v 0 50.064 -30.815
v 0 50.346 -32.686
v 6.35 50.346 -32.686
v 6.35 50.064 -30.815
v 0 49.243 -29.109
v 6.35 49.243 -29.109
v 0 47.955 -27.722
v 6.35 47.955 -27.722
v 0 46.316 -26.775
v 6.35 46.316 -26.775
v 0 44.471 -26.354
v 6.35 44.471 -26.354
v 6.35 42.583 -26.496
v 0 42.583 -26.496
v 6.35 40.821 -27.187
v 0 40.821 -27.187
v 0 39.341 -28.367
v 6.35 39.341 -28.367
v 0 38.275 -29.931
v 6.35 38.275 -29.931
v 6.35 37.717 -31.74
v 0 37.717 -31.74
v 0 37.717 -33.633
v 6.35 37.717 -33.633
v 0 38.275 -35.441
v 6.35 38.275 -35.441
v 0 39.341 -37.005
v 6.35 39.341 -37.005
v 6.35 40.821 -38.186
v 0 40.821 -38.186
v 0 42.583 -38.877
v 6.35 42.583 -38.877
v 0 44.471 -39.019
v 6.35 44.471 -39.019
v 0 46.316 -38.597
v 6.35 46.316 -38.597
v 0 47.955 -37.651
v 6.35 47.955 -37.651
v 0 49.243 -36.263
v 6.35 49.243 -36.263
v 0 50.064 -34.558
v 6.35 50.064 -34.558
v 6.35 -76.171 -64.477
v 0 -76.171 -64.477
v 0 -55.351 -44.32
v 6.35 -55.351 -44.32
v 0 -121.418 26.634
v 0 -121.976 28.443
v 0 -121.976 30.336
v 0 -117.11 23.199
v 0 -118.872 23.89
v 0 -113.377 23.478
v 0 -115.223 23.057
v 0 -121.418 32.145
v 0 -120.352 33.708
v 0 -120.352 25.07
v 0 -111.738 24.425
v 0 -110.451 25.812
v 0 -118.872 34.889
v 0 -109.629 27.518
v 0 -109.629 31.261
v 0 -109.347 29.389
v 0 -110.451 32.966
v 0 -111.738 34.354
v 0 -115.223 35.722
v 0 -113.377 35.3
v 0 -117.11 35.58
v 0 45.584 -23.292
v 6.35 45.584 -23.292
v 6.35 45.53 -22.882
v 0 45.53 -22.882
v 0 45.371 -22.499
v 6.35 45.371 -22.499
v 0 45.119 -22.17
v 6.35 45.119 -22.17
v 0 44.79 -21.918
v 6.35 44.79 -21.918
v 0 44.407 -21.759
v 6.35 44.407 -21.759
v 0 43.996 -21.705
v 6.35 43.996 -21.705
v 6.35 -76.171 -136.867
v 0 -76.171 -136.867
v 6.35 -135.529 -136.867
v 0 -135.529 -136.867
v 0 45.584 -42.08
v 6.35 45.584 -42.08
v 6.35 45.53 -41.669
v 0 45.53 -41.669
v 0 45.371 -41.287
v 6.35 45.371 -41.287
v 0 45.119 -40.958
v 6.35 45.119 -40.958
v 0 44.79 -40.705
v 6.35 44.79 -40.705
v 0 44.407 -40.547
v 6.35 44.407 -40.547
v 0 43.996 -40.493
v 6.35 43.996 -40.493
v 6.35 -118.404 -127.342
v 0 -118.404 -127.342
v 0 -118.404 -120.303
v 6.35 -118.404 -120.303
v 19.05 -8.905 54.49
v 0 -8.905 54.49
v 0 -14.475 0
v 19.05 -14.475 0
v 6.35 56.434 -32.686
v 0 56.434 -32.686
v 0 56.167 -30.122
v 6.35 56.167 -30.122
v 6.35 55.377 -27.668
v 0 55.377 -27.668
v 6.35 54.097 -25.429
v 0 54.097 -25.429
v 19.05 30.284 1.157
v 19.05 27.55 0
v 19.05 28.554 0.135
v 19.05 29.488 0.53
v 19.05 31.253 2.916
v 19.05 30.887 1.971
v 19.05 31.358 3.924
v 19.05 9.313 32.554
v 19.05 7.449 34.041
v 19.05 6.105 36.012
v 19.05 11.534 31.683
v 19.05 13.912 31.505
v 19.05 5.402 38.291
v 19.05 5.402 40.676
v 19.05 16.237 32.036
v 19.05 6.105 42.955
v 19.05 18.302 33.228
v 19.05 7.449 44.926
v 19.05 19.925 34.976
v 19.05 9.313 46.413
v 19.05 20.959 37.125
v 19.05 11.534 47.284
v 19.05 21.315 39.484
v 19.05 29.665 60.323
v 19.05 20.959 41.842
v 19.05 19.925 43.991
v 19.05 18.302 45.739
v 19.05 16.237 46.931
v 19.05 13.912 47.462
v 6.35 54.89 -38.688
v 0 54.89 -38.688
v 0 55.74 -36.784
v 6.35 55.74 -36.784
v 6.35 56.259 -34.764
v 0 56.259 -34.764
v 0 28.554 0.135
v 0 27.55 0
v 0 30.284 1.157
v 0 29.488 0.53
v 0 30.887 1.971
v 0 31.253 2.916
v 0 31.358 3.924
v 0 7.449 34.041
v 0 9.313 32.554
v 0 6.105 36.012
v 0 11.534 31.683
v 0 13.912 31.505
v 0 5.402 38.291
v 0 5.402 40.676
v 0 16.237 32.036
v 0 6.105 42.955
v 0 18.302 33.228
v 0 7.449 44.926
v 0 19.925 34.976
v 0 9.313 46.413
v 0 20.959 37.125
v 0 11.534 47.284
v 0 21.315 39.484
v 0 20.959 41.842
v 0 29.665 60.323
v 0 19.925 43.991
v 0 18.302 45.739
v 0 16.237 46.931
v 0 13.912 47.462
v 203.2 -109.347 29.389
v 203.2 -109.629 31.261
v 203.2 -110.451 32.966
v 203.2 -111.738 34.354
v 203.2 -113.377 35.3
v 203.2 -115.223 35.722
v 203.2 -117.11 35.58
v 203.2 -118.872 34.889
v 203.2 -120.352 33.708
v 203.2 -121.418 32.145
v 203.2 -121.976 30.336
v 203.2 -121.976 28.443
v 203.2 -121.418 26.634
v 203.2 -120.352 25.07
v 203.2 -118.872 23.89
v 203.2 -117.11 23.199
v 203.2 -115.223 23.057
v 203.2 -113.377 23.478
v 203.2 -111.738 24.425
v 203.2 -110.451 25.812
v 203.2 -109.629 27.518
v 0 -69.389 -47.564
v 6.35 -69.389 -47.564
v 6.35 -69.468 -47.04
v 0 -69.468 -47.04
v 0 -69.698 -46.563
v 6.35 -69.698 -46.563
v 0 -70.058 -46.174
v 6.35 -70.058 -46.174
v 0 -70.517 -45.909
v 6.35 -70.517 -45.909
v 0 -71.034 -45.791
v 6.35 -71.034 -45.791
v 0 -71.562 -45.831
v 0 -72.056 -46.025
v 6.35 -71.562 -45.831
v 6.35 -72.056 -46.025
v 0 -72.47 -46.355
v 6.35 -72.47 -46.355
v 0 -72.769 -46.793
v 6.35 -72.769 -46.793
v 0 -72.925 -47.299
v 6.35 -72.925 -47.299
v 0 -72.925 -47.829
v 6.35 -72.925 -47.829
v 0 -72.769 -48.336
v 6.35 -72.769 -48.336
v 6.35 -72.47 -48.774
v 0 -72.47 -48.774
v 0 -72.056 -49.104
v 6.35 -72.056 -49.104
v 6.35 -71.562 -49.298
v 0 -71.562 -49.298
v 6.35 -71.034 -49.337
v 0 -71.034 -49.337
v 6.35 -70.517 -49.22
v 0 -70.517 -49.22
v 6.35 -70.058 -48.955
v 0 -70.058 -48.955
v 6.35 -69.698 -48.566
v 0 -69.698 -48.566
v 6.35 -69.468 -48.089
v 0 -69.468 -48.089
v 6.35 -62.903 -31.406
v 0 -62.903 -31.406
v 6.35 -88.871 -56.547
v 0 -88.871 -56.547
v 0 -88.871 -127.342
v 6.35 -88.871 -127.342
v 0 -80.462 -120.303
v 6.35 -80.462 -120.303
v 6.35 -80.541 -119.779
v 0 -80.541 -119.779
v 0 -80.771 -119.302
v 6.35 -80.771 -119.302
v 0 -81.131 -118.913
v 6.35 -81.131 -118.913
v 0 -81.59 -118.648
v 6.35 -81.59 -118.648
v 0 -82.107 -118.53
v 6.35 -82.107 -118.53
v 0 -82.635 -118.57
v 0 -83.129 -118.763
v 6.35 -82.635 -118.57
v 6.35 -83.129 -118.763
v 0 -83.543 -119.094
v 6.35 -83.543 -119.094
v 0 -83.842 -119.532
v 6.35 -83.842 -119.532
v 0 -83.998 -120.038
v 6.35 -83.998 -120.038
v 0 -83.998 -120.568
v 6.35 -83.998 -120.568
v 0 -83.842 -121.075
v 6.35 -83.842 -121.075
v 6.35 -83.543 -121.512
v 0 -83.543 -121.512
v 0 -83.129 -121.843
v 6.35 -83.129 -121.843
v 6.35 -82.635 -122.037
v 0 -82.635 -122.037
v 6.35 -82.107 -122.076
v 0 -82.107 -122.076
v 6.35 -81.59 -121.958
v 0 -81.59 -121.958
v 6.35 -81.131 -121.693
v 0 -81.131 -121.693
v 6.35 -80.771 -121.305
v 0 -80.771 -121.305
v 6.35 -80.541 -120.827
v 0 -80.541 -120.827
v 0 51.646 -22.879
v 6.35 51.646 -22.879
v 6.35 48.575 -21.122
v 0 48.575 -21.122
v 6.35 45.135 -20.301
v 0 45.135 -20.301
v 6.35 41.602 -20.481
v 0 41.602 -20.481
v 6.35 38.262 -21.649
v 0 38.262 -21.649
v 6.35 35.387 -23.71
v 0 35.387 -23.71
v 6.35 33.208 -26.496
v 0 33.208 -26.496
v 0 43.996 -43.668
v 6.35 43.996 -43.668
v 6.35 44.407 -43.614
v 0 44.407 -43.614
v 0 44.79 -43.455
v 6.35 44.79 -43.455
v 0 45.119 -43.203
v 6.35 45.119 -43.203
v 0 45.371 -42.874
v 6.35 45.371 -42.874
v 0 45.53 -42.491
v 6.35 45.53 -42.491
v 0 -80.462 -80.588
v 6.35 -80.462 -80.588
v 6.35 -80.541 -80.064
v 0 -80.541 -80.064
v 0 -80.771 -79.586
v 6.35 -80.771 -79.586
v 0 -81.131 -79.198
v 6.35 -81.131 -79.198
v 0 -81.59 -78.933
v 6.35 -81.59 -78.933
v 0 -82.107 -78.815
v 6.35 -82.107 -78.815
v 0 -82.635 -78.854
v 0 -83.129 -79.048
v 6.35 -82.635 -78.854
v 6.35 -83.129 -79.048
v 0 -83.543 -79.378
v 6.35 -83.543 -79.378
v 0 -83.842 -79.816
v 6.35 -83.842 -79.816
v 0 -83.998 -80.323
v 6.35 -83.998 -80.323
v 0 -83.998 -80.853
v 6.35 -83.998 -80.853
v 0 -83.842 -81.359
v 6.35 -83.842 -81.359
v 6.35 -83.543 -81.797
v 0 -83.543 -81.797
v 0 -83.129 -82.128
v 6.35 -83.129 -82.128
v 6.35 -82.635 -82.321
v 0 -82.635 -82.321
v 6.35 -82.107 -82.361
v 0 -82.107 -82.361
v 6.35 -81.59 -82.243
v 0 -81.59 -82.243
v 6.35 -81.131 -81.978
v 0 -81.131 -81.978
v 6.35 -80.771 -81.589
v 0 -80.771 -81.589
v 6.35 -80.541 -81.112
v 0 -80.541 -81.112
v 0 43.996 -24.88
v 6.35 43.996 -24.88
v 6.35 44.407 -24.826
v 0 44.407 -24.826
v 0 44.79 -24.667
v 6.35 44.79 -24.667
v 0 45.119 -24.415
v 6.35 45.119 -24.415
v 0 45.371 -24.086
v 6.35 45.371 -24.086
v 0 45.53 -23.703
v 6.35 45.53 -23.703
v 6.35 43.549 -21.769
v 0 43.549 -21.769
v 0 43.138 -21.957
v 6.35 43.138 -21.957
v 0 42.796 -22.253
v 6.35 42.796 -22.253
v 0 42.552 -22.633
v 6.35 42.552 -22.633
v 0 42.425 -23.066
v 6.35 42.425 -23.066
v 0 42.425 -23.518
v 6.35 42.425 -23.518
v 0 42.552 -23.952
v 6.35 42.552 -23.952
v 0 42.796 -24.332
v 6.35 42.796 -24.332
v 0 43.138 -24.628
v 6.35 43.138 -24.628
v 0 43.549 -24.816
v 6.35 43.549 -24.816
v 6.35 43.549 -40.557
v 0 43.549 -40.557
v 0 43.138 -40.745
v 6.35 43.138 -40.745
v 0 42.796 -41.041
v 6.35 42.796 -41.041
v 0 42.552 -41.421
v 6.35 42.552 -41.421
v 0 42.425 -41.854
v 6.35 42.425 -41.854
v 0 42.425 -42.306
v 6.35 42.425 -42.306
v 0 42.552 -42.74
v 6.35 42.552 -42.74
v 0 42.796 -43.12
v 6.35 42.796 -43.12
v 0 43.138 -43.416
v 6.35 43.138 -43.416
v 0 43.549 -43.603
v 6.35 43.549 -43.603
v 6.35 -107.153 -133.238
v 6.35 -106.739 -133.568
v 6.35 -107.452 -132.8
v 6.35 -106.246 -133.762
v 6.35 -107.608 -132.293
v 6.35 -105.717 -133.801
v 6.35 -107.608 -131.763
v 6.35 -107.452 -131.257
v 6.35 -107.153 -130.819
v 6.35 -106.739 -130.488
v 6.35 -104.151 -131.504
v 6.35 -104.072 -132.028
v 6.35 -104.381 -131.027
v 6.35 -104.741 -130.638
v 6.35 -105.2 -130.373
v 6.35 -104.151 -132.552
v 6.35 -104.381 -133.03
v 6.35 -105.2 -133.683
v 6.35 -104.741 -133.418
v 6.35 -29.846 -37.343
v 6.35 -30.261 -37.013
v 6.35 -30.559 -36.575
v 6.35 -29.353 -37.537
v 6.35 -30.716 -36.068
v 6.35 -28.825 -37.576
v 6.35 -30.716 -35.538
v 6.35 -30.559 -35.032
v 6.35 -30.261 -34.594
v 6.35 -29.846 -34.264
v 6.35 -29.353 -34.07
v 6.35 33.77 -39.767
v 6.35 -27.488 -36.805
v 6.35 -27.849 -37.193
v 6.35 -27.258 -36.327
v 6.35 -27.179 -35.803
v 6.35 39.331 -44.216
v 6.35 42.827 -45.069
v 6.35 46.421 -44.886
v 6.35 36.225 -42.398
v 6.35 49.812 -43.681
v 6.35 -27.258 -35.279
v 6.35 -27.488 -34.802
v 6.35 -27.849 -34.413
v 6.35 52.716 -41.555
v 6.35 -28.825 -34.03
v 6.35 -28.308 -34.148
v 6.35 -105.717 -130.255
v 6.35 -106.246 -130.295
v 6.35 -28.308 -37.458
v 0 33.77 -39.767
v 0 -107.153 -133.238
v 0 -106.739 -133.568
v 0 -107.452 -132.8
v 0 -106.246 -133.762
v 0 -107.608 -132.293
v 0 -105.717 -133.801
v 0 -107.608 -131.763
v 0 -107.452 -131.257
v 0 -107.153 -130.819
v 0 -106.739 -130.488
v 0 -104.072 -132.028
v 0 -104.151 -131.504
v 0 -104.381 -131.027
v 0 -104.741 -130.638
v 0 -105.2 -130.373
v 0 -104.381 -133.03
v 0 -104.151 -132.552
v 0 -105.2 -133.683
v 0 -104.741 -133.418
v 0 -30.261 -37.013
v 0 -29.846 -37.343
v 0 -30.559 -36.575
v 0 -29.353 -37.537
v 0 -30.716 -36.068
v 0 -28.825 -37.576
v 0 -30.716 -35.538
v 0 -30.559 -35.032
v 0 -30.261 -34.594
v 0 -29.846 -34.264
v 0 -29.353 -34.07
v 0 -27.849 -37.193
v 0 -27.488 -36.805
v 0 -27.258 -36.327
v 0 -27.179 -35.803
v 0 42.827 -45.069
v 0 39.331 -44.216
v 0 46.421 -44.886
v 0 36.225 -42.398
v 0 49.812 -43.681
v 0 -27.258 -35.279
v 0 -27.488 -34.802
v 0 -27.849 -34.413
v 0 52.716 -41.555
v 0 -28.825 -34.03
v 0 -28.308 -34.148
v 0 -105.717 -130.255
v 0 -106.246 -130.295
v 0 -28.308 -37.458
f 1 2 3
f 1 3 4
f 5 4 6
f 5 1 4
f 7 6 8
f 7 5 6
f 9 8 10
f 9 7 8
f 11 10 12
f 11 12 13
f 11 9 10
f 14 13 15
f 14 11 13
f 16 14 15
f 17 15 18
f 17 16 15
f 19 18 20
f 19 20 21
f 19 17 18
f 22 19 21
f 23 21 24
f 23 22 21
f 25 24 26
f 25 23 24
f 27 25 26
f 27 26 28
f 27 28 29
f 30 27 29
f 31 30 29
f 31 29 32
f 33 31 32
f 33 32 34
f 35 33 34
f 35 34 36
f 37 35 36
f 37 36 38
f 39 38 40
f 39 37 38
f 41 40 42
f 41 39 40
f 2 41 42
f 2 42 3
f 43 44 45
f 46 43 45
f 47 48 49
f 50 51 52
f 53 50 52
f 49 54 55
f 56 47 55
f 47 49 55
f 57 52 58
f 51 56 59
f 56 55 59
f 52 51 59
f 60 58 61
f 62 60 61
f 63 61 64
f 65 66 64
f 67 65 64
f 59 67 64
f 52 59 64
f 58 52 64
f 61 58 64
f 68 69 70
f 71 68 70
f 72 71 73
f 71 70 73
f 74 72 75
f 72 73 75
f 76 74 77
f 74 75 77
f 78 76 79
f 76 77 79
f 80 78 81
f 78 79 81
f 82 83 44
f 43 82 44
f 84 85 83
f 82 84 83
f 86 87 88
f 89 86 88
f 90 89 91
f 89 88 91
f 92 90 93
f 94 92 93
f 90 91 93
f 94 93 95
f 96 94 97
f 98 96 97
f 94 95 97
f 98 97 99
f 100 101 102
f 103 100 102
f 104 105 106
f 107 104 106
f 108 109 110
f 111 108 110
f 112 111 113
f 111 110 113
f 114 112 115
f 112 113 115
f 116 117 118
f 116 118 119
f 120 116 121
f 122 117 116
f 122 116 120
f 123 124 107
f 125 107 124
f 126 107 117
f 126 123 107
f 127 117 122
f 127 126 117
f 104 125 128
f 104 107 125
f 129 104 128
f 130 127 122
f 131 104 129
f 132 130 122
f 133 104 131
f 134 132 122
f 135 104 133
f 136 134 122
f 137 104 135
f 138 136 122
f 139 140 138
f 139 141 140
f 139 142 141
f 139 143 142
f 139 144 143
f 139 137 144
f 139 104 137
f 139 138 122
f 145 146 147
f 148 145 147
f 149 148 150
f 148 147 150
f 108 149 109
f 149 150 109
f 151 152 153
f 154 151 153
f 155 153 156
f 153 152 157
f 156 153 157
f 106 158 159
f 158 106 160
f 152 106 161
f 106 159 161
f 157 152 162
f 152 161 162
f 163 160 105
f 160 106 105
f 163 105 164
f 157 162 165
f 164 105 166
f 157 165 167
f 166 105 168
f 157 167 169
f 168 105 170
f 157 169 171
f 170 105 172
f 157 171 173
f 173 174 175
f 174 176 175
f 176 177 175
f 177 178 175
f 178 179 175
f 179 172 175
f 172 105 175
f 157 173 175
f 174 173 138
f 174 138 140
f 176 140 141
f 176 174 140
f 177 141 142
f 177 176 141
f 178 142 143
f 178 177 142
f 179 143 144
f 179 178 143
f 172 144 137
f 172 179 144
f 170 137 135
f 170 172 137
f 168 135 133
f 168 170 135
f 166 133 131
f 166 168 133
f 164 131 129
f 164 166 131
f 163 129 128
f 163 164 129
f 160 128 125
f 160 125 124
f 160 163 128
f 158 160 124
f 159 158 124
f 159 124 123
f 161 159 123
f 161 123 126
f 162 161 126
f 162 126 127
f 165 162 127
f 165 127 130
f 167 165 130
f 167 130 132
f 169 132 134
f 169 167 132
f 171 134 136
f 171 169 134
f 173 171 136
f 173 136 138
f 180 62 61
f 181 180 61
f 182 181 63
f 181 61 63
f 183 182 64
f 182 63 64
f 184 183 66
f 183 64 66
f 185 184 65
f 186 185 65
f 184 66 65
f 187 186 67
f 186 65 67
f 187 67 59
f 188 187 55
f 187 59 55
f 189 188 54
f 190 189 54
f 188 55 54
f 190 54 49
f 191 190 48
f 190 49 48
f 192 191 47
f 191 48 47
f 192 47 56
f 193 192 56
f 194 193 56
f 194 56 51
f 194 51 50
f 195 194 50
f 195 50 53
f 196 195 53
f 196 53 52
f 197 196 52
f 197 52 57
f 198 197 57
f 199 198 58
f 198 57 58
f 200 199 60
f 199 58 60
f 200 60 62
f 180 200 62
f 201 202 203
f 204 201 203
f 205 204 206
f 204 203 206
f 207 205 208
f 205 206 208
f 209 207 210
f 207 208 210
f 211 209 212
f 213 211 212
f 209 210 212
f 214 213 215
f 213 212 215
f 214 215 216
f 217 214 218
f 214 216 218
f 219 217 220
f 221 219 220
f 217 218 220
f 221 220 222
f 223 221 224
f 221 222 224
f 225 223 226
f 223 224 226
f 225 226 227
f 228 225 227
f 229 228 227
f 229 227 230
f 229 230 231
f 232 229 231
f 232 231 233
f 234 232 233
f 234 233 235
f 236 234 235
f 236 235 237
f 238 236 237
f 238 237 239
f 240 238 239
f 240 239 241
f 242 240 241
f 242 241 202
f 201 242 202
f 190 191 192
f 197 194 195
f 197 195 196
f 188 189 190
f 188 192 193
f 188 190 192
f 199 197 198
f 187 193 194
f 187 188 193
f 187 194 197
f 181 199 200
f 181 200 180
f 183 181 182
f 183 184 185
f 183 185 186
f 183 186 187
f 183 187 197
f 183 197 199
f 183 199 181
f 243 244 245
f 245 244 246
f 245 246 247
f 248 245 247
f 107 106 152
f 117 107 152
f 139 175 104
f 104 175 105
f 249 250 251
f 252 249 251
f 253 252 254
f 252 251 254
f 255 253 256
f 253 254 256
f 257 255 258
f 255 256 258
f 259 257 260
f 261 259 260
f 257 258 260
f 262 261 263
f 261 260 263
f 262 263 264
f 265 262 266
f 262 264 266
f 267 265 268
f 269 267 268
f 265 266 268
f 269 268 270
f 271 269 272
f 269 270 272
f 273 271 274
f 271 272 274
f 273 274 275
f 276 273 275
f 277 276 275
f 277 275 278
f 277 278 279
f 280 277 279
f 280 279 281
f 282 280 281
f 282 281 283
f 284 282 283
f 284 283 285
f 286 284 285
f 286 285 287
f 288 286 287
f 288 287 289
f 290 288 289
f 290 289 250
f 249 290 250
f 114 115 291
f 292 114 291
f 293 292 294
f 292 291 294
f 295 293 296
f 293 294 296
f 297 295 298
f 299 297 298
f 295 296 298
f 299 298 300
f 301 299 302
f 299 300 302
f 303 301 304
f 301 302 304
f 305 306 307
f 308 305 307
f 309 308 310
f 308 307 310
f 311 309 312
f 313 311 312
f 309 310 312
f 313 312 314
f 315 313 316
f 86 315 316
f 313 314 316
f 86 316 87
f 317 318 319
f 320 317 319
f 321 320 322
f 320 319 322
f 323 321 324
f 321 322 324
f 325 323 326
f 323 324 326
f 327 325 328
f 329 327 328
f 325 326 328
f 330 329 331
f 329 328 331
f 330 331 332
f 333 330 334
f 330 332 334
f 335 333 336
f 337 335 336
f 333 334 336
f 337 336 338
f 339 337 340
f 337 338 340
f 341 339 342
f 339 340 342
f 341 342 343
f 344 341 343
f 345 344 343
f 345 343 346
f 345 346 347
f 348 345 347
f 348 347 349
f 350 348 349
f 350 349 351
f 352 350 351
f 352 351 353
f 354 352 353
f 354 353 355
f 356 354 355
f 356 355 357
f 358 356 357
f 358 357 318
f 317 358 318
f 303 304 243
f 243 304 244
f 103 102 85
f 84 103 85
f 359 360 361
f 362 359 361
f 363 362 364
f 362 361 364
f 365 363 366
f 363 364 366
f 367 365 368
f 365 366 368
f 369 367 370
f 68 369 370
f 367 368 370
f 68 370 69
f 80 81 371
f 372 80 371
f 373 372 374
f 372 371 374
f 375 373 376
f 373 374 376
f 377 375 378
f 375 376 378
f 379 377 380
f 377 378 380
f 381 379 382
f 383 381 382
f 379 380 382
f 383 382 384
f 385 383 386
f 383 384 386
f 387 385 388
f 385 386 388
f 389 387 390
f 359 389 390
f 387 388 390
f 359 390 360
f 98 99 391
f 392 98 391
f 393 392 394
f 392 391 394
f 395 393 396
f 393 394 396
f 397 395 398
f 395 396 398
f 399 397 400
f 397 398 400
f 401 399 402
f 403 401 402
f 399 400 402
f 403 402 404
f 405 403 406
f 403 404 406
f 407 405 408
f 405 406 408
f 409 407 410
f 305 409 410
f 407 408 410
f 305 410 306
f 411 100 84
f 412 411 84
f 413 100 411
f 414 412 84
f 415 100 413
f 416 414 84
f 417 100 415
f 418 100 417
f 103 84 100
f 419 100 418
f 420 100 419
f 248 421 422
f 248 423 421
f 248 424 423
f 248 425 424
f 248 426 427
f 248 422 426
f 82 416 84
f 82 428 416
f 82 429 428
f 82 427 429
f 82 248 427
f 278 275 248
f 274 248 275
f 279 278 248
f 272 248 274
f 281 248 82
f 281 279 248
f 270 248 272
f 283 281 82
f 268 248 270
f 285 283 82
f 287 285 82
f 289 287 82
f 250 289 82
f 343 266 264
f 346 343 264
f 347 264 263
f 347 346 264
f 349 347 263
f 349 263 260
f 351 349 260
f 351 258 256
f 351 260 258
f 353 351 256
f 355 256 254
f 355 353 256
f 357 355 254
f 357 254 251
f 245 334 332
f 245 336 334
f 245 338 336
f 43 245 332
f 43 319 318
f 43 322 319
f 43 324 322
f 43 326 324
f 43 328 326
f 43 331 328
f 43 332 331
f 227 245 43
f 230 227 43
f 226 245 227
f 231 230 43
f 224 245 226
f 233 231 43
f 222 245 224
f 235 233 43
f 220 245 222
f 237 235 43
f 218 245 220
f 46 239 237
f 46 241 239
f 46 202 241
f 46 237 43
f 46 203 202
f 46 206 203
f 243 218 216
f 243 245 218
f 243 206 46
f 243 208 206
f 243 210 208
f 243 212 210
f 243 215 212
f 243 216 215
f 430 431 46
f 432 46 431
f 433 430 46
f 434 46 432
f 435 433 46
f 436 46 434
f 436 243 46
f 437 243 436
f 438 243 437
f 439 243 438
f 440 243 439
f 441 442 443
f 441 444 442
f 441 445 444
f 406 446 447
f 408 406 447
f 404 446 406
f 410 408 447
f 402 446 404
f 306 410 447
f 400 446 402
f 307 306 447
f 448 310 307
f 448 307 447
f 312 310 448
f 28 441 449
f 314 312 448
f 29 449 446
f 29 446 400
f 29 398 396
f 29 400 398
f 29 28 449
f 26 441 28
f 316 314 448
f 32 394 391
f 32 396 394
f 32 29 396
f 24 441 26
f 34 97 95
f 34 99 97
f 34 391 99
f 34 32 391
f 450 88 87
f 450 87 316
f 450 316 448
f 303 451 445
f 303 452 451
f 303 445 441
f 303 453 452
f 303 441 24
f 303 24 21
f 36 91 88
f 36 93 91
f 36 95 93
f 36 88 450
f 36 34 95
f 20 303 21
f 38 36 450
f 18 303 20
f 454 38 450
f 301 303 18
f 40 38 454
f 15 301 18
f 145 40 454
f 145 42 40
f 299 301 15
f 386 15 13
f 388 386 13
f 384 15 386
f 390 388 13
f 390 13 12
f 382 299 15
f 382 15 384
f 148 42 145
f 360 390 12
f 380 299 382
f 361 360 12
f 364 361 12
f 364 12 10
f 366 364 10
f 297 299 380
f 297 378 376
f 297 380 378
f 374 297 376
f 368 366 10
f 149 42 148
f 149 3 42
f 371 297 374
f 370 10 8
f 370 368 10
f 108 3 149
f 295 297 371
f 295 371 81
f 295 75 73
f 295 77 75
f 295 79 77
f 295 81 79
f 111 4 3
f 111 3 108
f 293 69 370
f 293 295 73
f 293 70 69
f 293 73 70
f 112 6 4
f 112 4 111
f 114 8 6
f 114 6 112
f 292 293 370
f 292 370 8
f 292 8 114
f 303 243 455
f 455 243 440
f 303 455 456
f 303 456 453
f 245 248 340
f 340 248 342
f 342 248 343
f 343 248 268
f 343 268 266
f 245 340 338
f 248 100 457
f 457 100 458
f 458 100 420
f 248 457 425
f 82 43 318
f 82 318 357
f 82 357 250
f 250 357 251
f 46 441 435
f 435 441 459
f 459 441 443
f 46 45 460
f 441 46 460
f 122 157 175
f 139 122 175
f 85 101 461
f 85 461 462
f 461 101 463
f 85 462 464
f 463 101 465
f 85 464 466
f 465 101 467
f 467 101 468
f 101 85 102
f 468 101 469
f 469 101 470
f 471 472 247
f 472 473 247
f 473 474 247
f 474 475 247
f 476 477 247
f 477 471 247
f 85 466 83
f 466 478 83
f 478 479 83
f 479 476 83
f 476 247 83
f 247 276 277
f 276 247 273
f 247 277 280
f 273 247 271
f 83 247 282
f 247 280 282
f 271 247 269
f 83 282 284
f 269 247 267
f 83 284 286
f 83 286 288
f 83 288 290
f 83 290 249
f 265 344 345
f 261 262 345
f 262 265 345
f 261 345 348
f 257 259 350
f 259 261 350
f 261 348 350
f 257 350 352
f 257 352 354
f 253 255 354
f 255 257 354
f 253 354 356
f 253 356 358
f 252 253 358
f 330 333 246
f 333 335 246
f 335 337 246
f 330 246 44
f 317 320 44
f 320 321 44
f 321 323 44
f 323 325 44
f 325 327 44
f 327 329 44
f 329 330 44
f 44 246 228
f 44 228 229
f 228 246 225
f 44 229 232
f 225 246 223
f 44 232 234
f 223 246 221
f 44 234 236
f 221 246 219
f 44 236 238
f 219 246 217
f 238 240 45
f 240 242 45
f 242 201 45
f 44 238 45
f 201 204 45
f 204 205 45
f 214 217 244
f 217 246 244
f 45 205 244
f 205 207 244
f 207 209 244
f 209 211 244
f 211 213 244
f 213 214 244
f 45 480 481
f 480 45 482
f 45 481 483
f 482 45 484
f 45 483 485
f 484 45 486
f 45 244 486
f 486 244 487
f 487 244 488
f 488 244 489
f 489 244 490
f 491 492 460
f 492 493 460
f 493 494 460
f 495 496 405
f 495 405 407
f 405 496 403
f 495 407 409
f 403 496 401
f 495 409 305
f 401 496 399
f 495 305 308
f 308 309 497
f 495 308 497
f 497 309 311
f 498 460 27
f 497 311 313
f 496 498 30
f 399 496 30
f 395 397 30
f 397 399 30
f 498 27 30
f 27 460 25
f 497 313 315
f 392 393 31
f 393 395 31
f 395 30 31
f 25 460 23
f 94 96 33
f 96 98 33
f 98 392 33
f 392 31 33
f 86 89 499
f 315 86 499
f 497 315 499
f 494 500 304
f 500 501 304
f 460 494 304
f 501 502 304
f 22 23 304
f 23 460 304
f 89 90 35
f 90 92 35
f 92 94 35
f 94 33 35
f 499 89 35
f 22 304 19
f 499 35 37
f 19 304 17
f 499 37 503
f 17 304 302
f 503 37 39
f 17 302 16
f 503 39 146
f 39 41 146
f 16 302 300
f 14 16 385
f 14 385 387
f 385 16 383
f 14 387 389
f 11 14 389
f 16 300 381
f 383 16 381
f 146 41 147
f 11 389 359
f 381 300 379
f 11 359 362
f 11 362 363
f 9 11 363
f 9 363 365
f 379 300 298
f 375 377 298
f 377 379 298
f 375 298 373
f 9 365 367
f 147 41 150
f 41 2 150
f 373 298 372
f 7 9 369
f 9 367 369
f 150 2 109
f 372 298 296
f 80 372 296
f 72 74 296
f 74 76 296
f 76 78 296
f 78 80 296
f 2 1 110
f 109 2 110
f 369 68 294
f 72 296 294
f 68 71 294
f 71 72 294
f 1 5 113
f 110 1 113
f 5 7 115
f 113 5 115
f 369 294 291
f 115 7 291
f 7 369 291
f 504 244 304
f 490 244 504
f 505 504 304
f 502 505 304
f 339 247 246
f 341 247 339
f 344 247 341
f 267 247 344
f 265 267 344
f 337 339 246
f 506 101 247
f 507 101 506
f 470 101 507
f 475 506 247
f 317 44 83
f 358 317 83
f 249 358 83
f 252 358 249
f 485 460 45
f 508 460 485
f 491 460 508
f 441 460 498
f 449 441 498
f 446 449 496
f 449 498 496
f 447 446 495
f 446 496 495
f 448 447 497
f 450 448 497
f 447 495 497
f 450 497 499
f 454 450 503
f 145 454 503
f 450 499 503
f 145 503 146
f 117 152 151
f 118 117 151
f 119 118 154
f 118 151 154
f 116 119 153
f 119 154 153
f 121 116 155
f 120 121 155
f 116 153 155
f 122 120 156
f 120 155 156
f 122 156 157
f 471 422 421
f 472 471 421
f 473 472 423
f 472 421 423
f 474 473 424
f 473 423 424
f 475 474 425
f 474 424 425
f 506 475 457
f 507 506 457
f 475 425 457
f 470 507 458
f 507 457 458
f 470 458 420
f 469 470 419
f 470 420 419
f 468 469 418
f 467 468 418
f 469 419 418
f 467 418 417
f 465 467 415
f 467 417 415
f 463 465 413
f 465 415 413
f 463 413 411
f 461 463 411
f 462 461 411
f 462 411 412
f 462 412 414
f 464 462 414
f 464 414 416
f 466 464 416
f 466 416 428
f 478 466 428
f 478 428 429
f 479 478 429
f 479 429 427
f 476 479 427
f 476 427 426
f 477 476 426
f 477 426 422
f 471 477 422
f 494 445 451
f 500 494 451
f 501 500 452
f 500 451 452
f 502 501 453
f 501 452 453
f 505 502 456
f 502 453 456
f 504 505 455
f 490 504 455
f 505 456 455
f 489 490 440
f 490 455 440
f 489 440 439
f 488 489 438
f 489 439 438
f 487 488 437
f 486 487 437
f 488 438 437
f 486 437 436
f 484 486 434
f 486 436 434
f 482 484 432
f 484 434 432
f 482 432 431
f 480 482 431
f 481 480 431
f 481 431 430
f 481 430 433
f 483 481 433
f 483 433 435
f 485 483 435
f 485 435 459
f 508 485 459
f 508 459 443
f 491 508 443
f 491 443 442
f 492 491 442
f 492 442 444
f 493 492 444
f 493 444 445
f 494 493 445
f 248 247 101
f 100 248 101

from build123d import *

# Parameters (mm, degrees)
F0_R     = 8.001
F1_DEPTH = 19.05
F2_R     = 6.35
F3_DEPTH = 6.35
F4_R     = 6.35
F9_DEPTH = 203.2
F6_DEPTH = 6.351
F7_R     = 1.778
F8_DEPTH = 6.351


with BuildPart() as f1:
    # F0 (on Right) → F1 (new body)
    with BuildSketch(Plane.YZ):
        with BuildLine():
            ThreePointArc((27.549779, 0), (30.283969, 1.156643), (31.358064, 3.924302))
            Line((31.358064, 3.924302), (29.665329, 60.322541))
            Line((29.665329, 60.322541), (-8.904883, 54.489972))
            Line((-8.904883, 54.489972), (-14.474982, 0))
            Line((-14.474982, 0), (27.549779, 0))
        make_face()
        with Locations((13.313917, 39.483521)):
            Circle(F0_R, mode=Mode.SUBTRACT)
    extrude(amount=F1_DEPTH)


with BuildPart() as f3:
    # F2 (on Right) → F3 (new body)
    with BuildSketch(Plane.YZ):
        with BuildLine():
            ThreePointArc((33.77032, -39.7667), (44.630778, -45.107985), (54.890377, -38.687745))
            Line((54.890377, -38.687745), (33.77032, -39.7667))
        make_face()
        with BuildLine():
            Line((33.77032, -39.7667), (54.890377, -38.687745))
            ThreePointArc((54.890377, -38.687745), (56.041949, -35.784715), (56.434046, -32.686334))
            ThreePointArc((56.434046, -32.686334), (55.835499, -28.874375), (54.097463, -25.429302))
            Line((54.097463, -25.429302), (33.207971, -26.496478))
            ThreePointArc((33.207971, -26.496478), (31.569499, -33.212937), (33.77032, -39.7667))
        make_face()
        with Locations((43.996196, -32.686334)):
            Circle(F2_R, mode=Mode.SUBTRACT)
        with BuildLine():
            Line((-55.350841, -44.31961), (33.77032, -39.7667))
            ThreePointArc((33.77032, -39.7667), (31.569499, -33.212937), (33.207971, -26.496478))
            Line((33.207971, -26.496478), (-62.903235, -31.406487))
            Line((-62.903235, -31.406487), (-88.871296, -56.547195))
            Line((-88.871296, -56.547195), (-88.871296, -127.341716))
            Line((-88.871296, -127.341716), (-118.40374, -127.341716))
            Line((-118.40374, -127.341716), (-118.40374, -120.303118))
            Line((-118.40374, -120.303118), (-135.528811, -136.866716))
            Line((-135.528811, -136.866716), (-76.171296, -136.866716))
            Line((-76.171296, -136.866716), (-76.171296, -64.476716))
            Line((-76.171296, -64.476716), (-55.350841, -44.31961))
        make_face()
        with BuildLine():
            ThreePointArc((54.097463, -25.429302), (43.361615, -20.264683), (33.207971, -26.496478))
            Line((33.207971, -26.496478), (54.097463, -25.429302))
        make_face()
    extrude(amount=F3_DEPTH)

    # F5 (on face) → F6 (cut, through all)
    with BuildSketch(Plane.YZ.offset(6.35)):
        with BuildLine():
            ThreePointArc((43.996196, -21.704909), (42.408696, -23.292409), (43.996196, -24.879909))
            Line((43.996196, -24.879909), (43.996196, -21.704909))
        make_face()
        with BuildLine():
            Line((43.996196, -21.704909), (43.996196, -24.879909))
            ThreePointArc((43.996196, -24.879909), (45.118728, -24.414941), (45.583696, -23.292409))
            ThreePointArc((45.583696, -23.292409), (45.118728, -22.169877), (43.996196, -21.704909))
        make_face()
        with BuildLine():
            ThreePointArc((45.583696, -42.080259), (45.118728, -40.957727), (43.996196, -40.492759))
            Line((43.996196, -40.492759), (43.996196, -43.667759))
            ThreePointArc((43.996196, -43.667759), (45.118728, -43.202791), (45.583696, -42.080259))
        make_face()
        with BuildLine():
            Line((43.996196, -43.667759), (43.996196, -40.492759))
            ThreePointArc((43.996196, -40.492759), (42.408696, -42.080259), (43.996196, -43.667759))
        make_face()
    extrude(amount=-F6_DEPTH, mode=Mode.SUBTRACT)

    # F7 (on face) → F8 (cut, through all)
    with BuildSketch(Plane.YZ.offset(6.35)):
        with Locations((-105.850054, -132.028289)):
            Circle(F7_R)
        with Locations((-82.239799, -120.303117)):
            Circle(F7_R)
        with Locations((-82.239799, -80.587826)):
            Circle(F7_R)
        with Locations((-28.957387, -35.803366)):
            Circle(F7_R)
        with Locations((-71.166607, -47.564429)):
            Circle(F7_R)
    extrude(amount=-F8_DEPTH, mode=Mode.SUBTRACT)


with BuildPart() as f9:
    # F4 (on Right) → F9 (new body)
    with BuildSketch(Plane.YZ):
        with Locations((-115.697227, 29.389367)):
            Circle(F4_R)
    extrude(amount=F9_DEPTH)


solid = Compound([f1.part, f3.part, f9.part])
